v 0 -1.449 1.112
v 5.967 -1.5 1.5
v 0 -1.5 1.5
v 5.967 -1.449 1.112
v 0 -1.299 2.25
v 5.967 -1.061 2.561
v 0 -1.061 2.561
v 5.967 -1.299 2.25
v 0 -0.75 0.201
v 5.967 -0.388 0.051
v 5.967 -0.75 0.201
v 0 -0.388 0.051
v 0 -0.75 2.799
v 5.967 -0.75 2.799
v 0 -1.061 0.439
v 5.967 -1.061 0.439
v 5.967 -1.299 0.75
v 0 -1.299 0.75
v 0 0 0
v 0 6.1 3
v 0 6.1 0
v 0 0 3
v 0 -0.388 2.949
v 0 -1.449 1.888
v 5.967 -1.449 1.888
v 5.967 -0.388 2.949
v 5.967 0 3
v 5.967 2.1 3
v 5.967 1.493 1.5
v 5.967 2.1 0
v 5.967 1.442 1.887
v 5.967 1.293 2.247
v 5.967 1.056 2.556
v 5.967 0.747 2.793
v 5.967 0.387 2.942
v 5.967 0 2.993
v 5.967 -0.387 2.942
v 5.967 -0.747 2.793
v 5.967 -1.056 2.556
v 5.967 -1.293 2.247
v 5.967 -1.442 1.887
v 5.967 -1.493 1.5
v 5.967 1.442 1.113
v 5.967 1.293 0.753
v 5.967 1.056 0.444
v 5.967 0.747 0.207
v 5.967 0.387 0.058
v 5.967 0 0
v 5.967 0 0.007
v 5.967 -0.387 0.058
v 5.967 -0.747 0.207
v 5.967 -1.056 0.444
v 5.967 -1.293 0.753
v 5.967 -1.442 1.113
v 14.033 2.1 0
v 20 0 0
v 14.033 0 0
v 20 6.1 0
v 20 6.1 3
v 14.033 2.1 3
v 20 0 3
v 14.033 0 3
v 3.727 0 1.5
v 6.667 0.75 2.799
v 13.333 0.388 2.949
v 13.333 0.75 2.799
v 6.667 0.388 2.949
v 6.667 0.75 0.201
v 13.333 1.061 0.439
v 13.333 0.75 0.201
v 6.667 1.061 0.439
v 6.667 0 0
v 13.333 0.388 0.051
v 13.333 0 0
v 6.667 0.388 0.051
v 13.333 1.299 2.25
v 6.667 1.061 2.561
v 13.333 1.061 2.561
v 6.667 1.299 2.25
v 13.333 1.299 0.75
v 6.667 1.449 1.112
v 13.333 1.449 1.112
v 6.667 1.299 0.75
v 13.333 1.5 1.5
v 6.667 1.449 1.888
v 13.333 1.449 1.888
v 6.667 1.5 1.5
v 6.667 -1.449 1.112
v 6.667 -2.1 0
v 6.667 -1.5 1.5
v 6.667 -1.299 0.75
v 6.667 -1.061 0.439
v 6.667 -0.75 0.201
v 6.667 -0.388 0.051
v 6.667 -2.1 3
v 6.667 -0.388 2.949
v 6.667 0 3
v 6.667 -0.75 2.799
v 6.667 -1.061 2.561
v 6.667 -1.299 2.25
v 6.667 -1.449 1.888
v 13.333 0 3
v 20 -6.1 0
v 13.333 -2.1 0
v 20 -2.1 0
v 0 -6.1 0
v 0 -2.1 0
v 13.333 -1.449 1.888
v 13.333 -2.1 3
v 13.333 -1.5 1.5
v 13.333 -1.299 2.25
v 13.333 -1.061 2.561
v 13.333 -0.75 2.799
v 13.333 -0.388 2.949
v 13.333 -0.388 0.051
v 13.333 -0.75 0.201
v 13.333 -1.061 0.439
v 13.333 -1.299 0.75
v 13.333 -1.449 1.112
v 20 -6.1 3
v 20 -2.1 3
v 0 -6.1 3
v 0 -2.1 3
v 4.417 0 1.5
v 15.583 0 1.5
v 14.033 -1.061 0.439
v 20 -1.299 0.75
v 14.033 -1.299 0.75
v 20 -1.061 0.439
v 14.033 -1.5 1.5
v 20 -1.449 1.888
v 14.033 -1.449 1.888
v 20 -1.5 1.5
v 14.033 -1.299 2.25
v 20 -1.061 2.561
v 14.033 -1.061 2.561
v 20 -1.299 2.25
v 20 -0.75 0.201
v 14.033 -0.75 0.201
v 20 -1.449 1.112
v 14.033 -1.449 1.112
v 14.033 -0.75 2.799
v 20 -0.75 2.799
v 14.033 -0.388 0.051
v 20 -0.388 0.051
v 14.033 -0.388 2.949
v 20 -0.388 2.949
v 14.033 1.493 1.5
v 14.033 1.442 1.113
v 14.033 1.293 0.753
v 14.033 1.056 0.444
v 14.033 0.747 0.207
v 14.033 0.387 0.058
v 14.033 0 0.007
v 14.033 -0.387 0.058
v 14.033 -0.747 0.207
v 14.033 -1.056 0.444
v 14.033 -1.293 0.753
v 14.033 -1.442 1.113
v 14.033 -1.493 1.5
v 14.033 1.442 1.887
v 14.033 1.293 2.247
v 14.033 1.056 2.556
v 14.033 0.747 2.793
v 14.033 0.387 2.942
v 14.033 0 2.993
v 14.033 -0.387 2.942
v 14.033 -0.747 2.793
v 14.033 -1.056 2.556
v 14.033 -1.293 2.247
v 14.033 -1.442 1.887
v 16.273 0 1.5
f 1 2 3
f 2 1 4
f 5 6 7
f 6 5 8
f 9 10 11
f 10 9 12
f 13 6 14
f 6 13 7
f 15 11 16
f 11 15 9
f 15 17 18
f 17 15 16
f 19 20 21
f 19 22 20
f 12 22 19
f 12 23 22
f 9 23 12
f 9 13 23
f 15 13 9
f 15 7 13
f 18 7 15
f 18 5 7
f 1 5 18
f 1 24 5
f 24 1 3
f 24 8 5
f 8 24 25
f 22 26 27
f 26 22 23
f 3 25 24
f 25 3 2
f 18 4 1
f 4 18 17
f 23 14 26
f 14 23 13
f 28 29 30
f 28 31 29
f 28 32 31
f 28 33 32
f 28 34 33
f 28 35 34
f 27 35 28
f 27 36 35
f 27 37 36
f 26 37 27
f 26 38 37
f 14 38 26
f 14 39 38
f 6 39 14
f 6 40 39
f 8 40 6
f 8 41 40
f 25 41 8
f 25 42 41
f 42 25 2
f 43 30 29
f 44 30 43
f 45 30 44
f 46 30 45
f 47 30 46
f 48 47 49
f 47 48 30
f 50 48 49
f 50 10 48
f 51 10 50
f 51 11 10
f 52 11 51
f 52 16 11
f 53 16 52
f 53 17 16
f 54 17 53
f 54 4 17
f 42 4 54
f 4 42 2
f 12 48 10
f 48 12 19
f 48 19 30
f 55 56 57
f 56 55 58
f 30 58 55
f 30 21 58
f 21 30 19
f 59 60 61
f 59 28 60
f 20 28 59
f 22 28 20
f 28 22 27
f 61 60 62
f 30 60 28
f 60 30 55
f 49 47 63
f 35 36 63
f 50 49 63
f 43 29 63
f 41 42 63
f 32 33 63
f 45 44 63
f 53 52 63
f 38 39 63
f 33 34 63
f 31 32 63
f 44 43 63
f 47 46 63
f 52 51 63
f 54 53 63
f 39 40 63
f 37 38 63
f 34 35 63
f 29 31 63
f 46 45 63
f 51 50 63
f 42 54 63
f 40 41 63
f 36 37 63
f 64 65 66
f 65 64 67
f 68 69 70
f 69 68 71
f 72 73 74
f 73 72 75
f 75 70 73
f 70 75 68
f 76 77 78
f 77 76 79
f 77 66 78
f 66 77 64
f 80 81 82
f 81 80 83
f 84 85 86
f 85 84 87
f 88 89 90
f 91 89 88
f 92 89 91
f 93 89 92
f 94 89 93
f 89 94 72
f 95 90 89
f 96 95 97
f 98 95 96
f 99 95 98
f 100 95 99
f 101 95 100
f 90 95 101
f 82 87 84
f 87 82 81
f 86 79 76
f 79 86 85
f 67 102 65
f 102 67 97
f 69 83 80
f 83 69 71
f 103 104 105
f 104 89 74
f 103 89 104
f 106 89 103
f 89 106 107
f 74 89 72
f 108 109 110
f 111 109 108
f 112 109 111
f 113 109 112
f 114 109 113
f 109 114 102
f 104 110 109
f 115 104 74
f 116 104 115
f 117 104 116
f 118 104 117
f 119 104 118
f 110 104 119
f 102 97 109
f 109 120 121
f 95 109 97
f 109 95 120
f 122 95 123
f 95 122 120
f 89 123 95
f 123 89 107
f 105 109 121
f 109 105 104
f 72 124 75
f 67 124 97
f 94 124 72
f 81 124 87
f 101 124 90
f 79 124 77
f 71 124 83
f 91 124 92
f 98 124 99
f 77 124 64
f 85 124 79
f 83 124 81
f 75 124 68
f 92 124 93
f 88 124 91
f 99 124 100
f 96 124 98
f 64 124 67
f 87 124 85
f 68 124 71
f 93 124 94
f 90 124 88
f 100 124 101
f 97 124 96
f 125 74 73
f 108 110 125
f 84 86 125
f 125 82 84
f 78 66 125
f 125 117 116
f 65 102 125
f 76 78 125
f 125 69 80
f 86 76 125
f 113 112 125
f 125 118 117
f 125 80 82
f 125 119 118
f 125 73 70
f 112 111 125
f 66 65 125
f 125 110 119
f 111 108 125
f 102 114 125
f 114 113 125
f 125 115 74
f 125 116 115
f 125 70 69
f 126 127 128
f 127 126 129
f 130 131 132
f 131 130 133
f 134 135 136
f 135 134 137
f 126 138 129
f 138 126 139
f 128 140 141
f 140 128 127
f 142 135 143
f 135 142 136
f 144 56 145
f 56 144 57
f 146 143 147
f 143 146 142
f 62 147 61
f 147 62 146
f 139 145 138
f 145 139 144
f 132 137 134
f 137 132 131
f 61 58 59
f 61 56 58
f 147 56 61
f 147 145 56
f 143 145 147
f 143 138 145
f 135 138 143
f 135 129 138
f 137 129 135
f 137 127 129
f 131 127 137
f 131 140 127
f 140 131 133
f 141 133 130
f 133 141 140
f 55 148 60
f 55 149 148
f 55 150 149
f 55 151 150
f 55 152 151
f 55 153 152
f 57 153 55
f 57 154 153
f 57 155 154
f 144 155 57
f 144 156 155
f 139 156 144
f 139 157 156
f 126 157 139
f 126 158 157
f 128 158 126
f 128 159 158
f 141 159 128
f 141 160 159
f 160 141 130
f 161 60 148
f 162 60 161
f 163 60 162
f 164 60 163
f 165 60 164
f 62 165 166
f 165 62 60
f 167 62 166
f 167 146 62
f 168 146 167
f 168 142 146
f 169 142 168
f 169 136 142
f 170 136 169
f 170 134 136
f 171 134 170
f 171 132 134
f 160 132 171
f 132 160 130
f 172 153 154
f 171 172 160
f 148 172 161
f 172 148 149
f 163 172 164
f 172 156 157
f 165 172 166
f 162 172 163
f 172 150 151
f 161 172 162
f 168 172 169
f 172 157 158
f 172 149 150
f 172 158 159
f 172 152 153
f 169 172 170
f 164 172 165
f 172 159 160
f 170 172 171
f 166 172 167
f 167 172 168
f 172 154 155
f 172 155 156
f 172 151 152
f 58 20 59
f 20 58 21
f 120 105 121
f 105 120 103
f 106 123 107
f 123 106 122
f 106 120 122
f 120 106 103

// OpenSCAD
// mathgrrl cone hinge

//////////////////////////////////////////////////////
// parameters

// Length of the complete hinge
length = 20;

// Height (diameter) of the hinge
height = 3;

// Clearance between cones and holes
clearance = .7;		

// Clearance between hinge and sides
gap = .6; 				

// Parameters that the user does not get to specify
$fn=24*1;
border = 2*1; 
fudge = .01*1;			// to preserve mesh integrity
corner = 0*1;      	// space between hinge and corner
hinge_radius = height/2;
cone_height = 1.5*hinge_radius;  

//////////////////////////////////////////////////////
// renders

rotate(90,[0,1,0]) 
	translate([-hinge_radius,0,0])
		hinge();

translate([0,hinge_radius+gap,0]) bar();
translate([0,-2*border-hinge_radius-gap,0]) bar();

//translate([0,hinge_radius+gap,0]) square();
//translate([0,-length-hinge_radius-gap,0]) square();


//////////////////////////////////////////////////////
// module for hinge

module hinge(){
	rad = hinge_radius;
	clr = clearance;
	len = (length-2*corner)/3; 
	con = cone_height;
	// left outside hinge = (cylinder+box)-cone
	difference(){
		union(){
			translate([0,0,corner]) cylinder(h=len-clr,r=rad);
			translate([-rad,0,corner]) cube([2*rad,rad+gap,len-clr]);
		}
		translate([0,0,corner+len-con-clr+fudge]) cylinder(h=con,r1=0,r2=rad);
	}
	// inside hinge = cylinder+box+cone+cone
	union(){
		translate([0,0,corner+len]) cylinder(h=len,r=rad);
		translate([-rad,-rad-gap,corner+len]) cube([2*rad,rad+gap,len]);
		translate([0,0,corner+len-con]) cylinder(h=con,r1=0,r2=rad);
		translate([0,0,corner+2*len]) cylinder(h=con,r1=rad,r2=0);
	}
	// right outside hinge = (cylinder+box)-cone
	difference(){
		union(){
			translate([0,0,corner+2*len+clr]) cylinder(h=len-clr,r=rad);
			translate([-rad,0,corner+2*len+clr]) cube([2*rad,rad+gap,len-clr]);
		}
		translate([0,0,corner+2*len+clr-fudge]) cylinder(h=con,r1=rad,r2=0);	
	}
}

//////////////////////////////////////////////////////
// module for square shape

module square(){
	difference(){
		cube([length,length,height]);
		translate([border,border,-fudge])
			cube(	[length-2*border,length-2*border,height+2*fudge]);
	}
}

//////////////////////////////////////////////////////
// module for bar shape

module bar(){
	cube([length,2*border,height]);
}
